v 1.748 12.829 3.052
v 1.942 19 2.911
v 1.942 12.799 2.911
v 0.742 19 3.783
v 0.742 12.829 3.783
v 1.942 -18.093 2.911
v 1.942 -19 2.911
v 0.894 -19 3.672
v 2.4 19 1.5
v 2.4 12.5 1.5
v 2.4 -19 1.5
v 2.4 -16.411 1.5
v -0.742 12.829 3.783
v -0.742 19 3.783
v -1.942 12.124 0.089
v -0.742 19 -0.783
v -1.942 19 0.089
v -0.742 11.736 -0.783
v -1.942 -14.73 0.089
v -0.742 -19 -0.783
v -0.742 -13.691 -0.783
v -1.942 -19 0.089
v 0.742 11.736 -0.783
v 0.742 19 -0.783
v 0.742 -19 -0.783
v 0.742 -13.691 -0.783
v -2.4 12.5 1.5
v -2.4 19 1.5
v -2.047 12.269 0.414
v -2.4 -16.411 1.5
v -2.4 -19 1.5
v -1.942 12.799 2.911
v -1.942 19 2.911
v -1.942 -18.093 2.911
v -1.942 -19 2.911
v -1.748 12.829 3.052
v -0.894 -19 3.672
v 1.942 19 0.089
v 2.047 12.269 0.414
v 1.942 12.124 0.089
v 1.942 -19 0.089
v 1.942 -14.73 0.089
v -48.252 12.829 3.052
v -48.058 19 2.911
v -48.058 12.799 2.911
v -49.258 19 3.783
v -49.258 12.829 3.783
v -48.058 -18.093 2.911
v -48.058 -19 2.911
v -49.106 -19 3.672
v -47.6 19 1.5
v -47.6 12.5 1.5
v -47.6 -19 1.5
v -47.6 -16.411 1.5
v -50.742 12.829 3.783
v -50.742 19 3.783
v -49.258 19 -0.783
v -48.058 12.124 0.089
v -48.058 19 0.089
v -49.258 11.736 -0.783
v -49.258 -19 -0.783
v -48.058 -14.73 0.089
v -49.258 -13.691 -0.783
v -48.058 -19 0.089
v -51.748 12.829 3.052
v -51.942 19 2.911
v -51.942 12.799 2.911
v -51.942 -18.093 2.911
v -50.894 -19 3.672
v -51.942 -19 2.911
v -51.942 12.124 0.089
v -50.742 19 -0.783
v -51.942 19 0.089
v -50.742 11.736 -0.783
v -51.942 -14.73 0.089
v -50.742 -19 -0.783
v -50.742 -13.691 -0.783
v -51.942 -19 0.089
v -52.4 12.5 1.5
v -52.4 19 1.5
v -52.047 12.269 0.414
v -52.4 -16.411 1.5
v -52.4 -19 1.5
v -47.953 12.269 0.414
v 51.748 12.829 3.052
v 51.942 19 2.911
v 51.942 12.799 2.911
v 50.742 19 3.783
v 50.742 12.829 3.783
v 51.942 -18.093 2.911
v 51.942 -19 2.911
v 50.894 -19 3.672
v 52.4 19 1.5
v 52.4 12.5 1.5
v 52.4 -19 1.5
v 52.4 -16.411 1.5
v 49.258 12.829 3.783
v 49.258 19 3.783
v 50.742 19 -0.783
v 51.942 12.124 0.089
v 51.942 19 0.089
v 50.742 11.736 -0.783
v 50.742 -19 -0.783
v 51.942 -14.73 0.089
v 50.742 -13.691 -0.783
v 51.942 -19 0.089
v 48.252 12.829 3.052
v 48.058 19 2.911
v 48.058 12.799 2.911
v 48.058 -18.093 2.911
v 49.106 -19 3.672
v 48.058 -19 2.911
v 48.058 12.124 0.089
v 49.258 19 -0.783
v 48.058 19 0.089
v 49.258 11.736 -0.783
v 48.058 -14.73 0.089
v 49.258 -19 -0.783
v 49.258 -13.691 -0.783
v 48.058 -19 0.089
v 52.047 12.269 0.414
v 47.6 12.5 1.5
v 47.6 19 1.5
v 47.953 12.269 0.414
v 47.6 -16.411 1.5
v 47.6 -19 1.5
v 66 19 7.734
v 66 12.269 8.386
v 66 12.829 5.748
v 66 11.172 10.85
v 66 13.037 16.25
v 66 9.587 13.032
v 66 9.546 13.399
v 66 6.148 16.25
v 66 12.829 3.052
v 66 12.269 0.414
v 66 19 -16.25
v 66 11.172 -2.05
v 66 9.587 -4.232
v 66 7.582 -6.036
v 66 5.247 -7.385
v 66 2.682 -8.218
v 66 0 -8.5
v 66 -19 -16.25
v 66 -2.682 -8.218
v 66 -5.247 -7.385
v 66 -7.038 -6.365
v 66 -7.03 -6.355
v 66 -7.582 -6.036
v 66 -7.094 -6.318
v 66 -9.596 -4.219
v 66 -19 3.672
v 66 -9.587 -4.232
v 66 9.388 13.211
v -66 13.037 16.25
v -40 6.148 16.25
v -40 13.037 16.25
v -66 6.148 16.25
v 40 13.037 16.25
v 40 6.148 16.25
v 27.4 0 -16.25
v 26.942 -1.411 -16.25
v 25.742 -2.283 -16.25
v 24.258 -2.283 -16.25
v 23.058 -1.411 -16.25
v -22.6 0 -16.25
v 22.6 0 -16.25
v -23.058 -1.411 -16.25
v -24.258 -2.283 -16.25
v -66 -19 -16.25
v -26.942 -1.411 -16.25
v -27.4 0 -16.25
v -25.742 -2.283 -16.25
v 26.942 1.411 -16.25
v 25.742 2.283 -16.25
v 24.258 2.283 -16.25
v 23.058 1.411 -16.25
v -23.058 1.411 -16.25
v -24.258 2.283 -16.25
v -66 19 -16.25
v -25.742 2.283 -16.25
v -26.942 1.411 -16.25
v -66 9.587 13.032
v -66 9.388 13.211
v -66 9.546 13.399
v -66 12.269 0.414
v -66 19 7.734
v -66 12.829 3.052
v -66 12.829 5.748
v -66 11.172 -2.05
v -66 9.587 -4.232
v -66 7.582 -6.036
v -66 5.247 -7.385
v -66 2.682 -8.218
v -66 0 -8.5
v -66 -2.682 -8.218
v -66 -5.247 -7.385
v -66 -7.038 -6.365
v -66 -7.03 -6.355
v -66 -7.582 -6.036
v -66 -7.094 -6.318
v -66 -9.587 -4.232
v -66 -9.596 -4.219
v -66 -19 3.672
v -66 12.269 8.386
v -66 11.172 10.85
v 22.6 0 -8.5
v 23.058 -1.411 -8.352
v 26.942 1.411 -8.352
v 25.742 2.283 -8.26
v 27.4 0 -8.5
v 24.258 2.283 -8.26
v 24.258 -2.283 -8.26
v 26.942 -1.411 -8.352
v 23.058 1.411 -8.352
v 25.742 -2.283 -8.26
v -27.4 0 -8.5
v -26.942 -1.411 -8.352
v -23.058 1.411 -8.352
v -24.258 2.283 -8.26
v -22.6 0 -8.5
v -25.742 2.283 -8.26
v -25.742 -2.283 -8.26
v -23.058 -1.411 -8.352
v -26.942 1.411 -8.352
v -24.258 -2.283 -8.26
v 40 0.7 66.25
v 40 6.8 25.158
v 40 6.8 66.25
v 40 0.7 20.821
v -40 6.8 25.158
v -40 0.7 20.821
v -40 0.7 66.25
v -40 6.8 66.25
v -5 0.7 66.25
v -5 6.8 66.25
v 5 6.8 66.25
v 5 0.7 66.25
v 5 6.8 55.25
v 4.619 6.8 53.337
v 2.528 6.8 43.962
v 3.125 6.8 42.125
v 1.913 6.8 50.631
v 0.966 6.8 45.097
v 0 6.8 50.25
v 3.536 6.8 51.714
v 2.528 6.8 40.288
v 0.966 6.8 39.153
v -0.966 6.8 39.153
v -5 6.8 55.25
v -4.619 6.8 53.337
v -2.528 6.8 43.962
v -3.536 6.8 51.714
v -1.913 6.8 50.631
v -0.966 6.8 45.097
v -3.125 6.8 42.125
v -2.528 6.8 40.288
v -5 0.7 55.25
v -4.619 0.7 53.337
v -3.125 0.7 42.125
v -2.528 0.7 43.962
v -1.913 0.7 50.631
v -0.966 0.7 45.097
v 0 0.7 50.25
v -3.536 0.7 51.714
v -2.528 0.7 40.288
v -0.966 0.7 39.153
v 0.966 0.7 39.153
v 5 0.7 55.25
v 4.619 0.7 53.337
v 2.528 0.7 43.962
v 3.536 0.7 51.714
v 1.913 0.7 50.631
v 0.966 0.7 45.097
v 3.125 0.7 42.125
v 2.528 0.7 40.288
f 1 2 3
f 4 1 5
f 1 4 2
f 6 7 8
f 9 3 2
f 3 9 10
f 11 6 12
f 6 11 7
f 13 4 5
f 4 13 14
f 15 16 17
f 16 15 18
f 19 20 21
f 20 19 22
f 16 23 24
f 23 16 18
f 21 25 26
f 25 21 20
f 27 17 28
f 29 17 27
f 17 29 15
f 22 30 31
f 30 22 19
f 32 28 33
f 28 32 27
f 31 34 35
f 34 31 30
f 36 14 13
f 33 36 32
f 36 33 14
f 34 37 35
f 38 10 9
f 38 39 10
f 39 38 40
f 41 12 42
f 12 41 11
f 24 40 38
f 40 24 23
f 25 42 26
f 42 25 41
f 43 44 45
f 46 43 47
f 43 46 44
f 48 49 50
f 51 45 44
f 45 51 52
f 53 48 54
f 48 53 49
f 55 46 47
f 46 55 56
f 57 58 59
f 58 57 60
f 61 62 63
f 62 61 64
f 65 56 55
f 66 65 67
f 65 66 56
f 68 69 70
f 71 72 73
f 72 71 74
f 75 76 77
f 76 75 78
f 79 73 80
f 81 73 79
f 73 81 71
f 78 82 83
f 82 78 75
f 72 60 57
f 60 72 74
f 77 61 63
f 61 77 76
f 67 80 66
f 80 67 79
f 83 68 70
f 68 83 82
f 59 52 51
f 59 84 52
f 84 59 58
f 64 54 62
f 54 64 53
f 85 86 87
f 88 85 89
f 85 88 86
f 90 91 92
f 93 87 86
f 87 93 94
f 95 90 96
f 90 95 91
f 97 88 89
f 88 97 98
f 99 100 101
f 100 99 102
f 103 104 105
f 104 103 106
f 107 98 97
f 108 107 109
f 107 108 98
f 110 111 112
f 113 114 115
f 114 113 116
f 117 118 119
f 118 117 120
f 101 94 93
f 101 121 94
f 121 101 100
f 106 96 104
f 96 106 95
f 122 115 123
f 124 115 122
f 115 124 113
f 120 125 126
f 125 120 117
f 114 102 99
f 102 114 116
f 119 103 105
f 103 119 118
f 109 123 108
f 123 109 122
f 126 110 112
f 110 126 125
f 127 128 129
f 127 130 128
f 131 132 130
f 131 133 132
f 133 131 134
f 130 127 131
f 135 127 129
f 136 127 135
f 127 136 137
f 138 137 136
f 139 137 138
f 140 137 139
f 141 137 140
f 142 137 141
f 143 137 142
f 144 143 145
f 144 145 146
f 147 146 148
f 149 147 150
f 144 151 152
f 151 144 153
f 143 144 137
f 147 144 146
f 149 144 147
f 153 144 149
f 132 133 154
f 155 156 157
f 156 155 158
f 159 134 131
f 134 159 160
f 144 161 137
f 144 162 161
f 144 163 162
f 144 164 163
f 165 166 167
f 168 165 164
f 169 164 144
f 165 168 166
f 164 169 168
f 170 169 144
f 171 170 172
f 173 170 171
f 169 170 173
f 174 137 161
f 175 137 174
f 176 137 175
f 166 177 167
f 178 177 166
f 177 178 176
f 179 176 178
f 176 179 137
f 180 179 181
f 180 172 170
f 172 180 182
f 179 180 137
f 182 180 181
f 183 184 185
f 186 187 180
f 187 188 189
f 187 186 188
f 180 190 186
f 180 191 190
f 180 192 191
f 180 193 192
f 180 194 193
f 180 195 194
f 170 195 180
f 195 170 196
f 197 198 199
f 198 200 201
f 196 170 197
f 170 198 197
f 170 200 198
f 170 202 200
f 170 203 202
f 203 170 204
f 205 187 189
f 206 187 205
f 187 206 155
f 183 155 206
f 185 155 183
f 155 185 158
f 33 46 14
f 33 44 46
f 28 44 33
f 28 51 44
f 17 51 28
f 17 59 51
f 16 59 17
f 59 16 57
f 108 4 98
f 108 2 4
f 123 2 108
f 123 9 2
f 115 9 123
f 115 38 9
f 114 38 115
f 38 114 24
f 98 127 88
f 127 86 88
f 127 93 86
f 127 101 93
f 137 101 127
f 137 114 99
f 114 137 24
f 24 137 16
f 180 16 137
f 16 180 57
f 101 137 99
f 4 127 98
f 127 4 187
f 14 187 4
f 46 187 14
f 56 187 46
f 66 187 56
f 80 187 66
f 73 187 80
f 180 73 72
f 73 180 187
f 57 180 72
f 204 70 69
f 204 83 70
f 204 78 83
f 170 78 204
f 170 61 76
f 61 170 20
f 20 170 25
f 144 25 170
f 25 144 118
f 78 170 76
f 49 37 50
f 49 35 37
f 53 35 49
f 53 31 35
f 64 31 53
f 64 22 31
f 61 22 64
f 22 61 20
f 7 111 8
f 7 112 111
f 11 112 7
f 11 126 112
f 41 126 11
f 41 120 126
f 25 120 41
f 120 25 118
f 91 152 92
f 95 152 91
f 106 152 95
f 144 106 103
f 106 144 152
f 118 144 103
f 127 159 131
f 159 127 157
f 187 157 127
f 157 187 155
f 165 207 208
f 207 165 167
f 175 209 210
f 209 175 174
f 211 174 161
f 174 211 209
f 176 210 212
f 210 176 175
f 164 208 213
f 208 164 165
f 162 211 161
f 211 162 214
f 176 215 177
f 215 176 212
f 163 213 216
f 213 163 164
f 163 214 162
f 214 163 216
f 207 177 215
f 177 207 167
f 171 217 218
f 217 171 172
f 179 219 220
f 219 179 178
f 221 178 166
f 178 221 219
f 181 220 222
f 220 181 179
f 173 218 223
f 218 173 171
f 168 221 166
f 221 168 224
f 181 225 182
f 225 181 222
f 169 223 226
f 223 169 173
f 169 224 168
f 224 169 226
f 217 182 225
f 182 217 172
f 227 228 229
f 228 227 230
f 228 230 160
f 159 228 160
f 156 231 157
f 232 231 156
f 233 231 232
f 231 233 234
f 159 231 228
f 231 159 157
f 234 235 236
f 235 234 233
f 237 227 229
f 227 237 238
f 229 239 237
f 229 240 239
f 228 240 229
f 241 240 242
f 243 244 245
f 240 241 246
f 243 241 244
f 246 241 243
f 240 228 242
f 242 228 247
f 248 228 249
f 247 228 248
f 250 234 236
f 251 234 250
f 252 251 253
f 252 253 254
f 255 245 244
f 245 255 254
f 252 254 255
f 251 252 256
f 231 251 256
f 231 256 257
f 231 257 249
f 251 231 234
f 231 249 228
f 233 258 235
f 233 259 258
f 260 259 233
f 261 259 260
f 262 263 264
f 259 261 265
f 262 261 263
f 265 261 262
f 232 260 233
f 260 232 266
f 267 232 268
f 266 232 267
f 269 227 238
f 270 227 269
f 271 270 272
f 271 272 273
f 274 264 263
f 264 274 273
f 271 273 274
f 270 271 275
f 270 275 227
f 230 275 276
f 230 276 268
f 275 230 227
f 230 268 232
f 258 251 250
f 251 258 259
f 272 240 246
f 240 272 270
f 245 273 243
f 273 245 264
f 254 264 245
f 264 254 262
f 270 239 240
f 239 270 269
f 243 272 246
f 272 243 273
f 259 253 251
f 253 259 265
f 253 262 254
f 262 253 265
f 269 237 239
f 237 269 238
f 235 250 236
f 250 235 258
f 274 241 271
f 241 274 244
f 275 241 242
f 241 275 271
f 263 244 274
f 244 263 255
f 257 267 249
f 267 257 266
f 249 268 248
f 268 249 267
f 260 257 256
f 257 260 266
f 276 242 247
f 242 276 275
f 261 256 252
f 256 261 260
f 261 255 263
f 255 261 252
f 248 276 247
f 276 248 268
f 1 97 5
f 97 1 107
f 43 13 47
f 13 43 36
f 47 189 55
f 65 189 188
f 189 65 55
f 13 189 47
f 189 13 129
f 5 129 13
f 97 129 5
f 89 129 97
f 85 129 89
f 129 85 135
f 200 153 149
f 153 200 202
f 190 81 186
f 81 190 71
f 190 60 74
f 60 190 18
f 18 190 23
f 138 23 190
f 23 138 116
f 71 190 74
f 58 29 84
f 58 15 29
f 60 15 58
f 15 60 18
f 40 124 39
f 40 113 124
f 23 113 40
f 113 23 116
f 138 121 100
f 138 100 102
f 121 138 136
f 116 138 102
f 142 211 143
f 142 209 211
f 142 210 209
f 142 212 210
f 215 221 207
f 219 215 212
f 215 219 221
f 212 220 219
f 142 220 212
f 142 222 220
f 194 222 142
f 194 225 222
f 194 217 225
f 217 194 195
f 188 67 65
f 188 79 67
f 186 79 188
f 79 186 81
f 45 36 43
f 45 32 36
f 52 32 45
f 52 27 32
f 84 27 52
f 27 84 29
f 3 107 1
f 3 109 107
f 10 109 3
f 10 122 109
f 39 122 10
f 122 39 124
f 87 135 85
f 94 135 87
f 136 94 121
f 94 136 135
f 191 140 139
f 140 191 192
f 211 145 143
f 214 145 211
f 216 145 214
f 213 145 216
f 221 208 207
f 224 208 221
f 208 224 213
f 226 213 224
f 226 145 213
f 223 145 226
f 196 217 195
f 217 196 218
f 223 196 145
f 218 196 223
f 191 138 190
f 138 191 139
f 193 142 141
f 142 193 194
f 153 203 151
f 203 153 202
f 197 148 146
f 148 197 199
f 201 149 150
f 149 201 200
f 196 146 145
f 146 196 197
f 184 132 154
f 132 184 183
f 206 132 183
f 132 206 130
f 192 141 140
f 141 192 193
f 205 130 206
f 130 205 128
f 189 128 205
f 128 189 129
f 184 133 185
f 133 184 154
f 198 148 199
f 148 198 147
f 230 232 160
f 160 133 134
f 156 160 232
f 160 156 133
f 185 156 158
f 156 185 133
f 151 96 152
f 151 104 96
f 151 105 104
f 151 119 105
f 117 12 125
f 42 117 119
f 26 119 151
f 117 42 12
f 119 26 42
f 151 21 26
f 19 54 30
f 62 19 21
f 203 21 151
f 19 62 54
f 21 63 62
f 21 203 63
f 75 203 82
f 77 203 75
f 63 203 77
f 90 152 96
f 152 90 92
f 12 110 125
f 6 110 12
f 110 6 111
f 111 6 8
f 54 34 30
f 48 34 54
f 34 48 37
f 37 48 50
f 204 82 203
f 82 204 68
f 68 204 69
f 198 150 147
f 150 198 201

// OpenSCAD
nakladka_sz = 38; //31.4
nakladka_dl = 132;
nakladka_h = 32.5;
dno_grubosc = 7.75;

rama_sr = 25.8;

sruba_sr = 4.8;
sruba_od_dna = 15.35;
sruba_od_boku = 12.7;
sruby_odstep = 50;

mocowanie_h = 50; //35
mocowanie_sr1 = 10; // lub 12
mocowanie_gr = (nakladka_sz-rama_sr)/2;
mocowanie_dl = 80;

module sruba_dziura(sr){
    rotate([90,0,0]){
        cylinder(h=nakladka_sz+30, d=sr, center=true, $fn=10);
        
    }
}

module mocowanie(h, sr1, gr, dl, sr2){
    difference(){
    cube([dl, gr, h],center = true);
    
    translate([0,0,h/2-16+sr1/2]){
    rotate([90,0,0]){
      cylinder(gr+10, d=sr1, center=true);   
    }
    }
    translate([0,0,h-16+sr1/2]){
        cube([sr1, gr+10, h],center = true);
    }
    translate([0,0,h/2-16-sr2/2-5]){
    rotate([90,0,0]){
    cylinder(gr+10, d=sr2, center=true);
    }
    }
    
    }
}

difference(){
union(){
    difference(){
        cube([nakladka_dl, nakladka_sz, nakladka_h], center=true);
        

        
                   rotate([35,0,0]){
        translate([0,25,-2.5]){
            #cube([nakladka_dl+30, 10, 40],center = true);
        }}
        
        
        
     
        translate([0,0,-nakladka_h/2+sruba_sr/2+sruba_od_dna]){
            sruba_dziura(sruba_sr);
            
            translate([-sruby_odstep,0,0]){
               sruba_dziura(sruba_sr); 
            }
            
             translate([sruby_odstep,0,0]){
               sruba_dziura(sruba_sr); 
            }
            
        }
        translate([25,0,0]){
            rotate([-90,0,0]){
                sruba_dziura(sruba_sr); 
            }
        }
         translate([-25,0,0]){
            rotate([-90,0,0]){
                sruba_dziura(sruba_sr); 
            }
        }
    }
    
    difference(){
    translate([0,nakladka_sz/2-mocowanie_gr/2-mocowanie_gr,nakladka_h/2+5]){
        cube([mocowanie_dl,mocowanie_gr+2,10], center = true);}
        
                           rotate([35,0,0]){
        translate([0,25,-2.5]){
            #cube([nakladka_dl+30, 10, 50],center = true);
        }}
    }

    translate([0,nakladka_sz/2-mocowanie_gr/2-mocowanie_gr*2,nakladka_h/2+mocowanie_h/2]){
        mocowanie(mocowanie_h, mocowanie_sr1, mocowanie_gr, mocowanie_dl, 6.25);
    }

}
        translate([0,0,-nakladka_h/2+dno_grubosc+rama_sr/2]){
        rotate([0,90,0]){
            #cylinder(h=nakladka_dl+30, d=rama_sr, center=true);
            
        }
        }
        
        rotate([50,0,0]){
        translate([0,3.5,14.2]){
            #cube([nakladka_dl+30, rama_sr, rama_sr],center = true);
        }}
        

        
        
}
